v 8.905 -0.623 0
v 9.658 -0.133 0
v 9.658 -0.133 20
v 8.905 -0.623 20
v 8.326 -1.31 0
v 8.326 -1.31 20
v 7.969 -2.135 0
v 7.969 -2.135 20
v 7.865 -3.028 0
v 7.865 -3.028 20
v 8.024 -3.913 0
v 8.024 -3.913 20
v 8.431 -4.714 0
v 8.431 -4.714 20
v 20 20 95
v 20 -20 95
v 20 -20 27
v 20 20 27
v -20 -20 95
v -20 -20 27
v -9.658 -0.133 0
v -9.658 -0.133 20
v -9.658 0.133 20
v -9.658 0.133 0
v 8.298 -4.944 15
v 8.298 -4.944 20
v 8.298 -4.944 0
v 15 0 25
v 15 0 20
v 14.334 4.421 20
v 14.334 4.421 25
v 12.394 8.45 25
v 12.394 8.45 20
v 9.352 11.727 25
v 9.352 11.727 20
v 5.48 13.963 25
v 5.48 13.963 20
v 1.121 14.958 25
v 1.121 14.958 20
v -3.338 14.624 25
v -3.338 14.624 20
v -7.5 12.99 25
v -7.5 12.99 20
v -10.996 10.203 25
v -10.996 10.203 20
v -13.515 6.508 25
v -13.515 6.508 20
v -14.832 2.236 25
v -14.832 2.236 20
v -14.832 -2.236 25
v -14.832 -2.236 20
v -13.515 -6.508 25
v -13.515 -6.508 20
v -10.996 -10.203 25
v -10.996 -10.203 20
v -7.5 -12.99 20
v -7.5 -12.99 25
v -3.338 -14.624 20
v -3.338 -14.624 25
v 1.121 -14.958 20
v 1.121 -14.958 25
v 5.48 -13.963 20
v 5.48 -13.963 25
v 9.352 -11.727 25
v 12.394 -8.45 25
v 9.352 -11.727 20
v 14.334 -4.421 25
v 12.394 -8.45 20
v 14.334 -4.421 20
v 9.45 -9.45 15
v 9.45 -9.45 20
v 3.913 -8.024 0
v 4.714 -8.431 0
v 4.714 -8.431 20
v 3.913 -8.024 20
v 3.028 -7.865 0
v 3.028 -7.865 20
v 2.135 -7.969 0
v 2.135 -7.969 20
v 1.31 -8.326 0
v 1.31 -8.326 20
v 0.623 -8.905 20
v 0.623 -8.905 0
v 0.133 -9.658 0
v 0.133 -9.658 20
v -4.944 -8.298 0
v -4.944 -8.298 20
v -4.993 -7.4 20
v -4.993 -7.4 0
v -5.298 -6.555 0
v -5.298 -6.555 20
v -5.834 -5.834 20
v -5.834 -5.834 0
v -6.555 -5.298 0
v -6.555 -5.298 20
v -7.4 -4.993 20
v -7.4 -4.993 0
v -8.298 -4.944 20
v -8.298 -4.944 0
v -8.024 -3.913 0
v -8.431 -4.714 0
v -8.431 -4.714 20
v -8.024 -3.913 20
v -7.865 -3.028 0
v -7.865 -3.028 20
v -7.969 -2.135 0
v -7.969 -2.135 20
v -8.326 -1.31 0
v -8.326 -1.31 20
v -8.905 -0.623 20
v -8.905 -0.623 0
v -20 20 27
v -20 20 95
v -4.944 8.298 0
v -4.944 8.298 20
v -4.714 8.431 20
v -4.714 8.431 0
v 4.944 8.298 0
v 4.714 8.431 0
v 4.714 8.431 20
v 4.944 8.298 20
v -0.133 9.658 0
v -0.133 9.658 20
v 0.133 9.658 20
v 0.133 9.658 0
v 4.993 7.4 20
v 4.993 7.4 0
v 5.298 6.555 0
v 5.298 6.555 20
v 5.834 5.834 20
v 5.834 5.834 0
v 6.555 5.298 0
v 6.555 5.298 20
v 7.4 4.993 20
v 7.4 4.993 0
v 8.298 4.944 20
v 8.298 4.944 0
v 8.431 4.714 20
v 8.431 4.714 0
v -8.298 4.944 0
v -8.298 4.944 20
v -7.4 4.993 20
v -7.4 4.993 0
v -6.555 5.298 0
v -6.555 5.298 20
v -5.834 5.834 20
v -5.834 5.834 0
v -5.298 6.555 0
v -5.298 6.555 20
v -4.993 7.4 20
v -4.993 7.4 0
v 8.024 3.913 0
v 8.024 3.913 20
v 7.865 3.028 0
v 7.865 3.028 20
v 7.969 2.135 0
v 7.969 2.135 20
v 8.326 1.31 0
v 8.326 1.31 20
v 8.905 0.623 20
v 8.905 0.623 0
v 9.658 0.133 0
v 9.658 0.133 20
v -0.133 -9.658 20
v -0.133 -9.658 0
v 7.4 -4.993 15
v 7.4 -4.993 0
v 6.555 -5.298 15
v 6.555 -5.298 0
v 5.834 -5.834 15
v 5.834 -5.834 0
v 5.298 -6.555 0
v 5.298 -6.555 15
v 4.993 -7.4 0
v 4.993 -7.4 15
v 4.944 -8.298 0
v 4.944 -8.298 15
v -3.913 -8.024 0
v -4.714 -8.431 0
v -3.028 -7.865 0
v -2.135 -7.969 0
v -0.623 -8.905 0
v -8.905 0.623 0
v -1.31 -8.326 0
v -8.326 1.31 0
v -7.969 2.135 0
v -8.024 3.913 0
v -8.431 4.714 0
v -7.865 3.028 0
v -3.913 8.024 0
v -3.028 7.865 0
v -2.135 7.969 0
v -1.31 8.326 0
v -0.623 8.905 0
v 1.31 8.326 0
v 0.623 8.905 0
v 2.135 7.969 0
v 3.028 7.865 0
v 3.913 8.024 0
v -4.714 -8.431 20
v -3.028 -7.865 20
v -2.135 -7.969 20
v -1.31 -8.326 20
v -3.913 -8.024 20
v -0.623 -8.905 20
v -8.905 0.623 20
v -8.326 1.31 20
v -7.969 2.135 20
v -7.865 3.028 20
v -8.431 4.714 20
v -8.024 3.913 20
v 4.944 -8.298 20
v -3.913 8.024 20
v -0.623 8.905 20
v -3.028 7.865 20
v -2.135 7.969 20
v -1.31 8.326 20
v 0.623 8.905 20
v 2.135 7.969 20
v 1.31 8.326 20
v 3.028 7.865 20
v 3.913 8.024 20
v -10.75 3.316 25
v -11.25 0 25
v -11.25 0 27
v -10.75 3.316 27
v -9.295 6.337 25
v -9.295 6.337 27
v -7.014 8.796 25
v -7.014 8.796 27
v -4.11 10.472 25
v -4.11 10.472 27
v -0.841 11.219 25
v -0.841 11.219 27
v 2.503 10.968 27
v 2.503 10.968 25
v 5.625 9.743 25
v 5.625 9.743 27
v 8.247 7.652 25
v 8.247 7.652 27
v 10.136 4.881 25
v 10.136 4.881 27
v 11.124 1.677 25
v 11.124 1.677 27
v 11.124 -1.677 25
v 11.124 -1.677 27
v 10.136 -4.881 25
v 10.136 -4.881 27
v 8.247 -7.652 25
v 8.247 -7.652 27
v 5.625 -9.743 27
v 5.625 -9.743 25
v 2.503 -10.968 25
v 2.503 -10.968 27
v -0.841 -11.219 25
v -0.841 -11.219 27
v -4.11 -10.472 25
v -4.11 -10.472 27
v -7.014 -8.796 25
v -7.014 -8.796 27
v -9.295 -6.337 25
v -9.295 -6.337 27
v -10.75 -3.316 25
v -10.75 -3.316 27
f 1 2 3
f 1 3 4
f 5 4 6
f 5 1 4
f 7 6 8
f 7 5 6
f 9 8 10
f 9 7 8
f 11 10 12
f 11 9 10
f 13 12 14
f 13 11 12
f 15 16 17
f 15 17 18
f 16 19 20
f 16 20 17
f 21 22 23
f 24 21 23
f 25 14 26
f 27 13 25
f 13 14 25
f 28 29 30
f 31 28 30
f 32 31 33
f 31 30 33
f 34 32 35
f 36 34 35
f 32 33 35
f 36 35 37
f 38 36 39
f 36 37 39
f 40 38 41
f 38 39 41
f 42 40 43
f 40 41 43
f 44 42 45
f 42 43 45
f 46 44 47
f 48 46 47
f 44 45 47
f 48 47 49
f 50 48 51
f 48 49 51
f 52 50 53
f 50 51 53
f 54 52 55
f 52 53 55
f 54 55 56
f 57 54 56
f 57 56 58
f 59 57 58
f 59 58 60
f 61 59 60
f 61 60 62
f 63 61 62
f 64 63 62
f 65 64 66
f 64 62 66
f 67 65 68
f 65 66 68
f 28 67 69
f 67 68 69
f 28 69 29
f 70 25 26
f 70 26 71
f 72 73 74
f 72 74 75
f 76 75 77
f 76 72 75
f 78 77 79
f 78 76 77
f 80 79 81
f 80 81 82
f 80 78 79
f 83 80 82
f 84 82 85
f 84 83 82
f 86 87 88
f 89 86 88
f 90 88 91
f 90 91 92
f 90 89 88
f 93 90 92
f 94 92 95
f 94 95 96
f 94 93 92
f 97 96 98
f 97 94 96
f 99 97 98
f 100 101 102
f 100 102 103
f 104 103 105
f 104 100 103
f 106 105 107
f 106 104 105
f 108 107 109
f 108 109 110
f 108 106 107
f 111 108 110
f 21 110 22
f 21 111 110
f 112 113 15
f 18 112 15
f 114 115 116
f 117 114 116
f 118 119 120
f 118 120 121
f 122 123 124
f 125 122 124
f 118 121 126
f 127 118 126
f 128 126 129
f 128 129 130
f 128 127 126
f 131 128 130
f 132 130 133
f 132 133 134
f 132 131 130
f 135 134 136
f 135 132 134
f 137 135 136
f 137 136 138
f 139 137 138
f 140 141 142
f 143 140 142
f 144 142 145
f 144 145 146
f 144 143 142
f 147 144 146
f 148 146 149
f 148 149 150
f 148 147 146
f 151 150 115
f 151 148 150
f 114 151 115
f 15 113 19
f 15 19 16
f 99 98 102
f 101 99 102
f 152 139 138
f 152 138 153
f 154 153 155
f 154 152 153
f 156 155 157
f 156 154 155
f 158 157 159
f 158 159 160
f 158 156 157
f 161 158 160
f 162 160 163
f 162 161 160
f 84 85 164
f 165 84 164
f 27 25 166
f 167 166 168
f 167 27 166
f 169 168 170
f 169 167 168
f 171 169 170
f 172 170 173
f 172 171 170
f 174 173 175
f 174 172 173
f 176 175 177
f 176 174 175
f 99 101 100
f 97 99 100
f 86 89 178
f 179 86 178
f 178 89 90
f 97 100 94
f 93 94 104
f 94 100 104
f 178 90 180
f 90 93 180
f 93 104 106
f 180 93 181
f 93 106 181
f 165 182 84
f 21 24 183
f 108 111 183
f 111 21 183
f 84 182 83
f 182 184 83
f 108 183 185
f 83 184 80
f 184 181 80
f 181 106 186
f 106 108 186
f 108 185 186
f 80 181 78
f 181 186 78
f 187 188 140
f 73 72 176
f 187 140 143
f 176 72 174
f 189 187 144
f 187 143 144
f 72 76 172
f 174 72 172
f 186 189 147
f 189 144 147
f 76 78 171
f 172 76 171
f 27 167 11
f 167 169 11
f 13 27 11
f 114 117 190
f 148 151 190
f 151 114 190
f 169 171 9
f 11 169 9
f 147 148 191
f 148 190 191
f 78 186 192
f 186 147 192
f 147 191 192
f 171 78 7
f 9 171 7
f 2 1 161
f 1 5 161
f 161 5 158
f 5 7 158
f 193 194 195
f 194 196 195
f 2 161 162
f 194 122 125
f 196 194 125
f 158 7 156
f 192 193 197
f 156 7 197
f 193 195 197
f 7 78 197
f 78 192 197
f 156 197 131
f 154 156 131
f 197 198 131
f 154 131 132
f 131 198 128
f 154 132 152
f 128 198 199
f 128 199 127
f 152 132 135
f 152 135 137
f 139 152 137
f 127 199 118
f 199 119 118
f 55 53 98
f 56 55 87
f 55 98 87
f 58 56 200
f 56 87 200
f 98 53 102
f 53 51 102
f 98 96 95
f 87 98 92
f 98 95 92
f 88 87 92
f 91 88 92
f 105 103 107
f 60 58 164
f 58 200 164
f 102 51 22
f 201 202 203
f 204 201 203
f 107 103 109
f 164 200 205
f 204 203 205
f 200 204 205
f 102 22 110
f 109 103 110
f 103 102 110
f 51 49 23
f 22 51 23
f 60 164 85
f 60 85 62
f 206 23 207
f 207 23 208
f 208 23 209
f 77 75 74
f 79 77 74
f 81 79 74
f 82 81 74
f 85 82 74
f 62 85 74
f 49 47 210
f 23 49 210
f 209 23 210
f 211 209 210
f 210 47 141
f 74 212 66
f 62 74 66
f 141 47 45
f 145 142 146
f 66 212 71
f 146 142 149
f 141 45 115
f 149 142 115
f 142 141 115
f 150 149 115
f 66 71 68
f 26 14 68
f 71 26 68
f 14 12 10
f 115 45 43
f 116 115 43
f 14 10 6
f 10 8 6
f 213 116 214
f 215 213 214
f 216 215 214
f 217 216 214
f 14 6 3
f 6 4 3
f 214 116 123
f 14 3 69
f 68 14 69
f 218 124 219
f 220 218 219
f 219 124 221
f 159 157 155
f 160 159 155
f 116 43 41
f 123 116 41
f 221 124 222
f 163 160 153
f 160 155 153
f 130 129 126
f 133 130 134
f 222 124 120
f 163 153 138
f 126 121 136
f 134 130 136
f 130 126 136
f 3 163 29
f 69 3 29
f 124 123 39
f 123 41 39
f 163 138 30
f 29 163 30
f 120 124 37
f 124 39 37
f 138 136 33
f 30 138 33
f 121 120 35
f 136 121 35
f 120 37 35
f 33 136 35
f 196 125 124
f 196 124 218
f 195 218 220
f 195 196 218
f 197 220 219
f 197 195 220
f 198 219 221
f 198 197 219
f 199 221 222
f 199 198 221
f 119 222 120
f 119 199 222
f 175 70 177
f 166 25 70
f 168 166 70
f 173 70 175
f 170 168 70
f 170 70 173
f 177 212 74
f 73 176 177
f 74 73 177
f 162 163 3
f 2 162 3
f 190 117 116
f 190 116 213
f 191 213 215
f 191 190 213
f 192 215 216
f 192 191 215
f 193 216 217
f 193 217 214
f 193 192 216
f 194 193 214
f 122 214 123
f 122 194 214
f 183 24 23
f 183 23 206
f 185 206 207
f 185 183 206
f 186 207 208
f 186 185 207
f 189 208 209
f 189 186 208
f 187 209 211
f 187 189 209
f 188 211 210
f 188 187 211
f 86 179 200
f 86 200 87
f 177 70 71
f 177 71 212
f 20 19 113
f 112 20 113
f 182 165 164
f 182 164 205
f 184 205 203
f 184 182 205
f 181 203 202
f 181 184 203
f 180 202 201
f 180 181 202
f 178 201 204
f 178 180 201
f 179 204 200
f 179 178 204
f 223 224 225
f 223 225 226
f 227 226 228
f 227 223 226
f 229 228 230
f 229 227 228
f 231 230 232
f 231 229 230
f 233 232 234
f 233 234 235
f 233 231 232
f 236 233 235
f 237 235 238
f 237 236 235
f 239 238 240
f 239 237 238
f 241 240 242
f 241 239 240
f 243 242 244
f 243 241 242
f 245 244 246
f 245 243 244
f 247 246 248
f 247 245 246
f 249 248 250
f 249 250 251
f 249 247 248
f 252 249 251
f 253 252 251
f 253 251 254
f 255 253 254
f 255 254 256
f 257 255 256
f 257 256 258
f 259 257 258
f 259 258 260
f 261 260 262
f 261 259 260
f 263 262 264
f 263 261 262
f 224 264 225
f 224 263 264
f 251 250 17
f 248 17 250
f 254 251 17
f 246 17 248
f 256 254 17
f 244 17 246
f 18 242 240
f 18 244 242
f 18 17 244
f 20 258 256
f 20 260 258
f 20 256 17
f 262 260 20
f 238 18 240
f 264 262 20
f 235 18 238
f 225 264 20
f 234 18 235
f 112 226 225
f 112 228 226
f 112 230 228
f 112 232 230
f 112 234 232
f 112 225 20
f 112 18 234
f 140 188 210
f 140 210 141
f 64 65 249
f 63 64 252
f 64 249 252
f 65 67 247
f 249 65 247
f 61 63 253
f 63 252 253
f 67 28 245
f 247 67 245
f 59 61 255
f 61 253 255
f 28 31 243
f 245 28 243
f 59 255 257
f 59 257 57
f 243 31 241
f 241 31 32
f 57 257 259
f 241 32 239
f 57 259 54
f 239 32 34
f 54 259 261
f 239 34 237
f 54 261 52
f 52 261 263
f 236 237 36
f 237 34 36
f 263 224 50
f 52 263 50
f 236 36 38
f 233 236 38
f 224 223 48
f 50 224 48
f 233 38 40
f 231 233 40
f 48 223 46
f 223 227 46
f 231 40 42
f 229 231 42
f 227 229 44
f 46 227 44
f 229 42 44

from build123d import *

# Parameters (mm, degrees)
CROQUIS1_R              = 10
SALIENTE_EXTRUIR1_DEPTH = 20
CROQUIS2_R              = 10
CORTAR_EXTRUIR2_DEPTH   = 20
CROQUIS3_R              = 15
SALIENTE_EXTRUIR2_DEPTH = 5
SALIENTE_EXTRUIR3_START = 5
SALIENTE_EXTRUIR3_DEPTH = 5
CROQUIS6_W              = 40
CROQUIS6_H              = 40
SALIENTE_EXTRUIR4_DEPTH = 70
CROQUIS8_W              = 40
CROQUIS8_H              = 40
CROQUIS8_R              = 11.25
CORTAR_EXTRUIR3_DEPTH   = 2


with BuildPart() as part:
    # Croquis1 → Saliente-Extruir1 (new body)
    with BuildSketch(Plane.XY):
        Circle(CROQUIS1_R)
    extrude(amount=SALIENTE_EXTRUIR1_DEPTH)

    # Croquis2 → Cortar-Extruir2 (cut)
    with BuildSketch(Plane(origin=(0, 0, 0), x_dir=(-1, 0, 0), z_dir=(0, 0, -1))):
        Circle(CROQUIS2_R)
        with BuildLine():
            Line((0.133032496, 9.658342122), (-0.133032496, 9.658342122))
            ThreePointArc((-0.133032496, 9.658342122), (-2.135257122, 7.968888067), (-4.71396154, 8.430885884))
            Line((-4.71396154, 8.430885884), (-4.944380582, 8.297853388))
            ThreePointArc((-4.944380582, 8.297853388), (-5.833630945, 5.833630945), (-8.297853388, 4.944380582))
            Line((-8.297853388, 4.944380582), (-8.430885884, 4.71396154))
            ThreePointArc((-8.430885884, 4.71396154), (-7.968888067, 2.135257122), (-9.658342122, 0.133032496))
            Line((-9.658342122, 0.133032496), (-9.658342122, -0.133032496))
            ThreePointArc((-9.658342122, -0.133032496), (-7.968888067, -2.135257122), (-8.430885884, -4.71396154))
            Line((-8.430885884, -4.71396154), (-8.297853388, -4.944380582))
            ThreePointArc((-8.297853388, -4.944380582), (-5.833630945, -5.833630945), (-4.944380582, -8.297853388))
            Line((-4.944380582, -8.297853388), (-4.71396154, -8.430885884))
            ThreePointArc((-4.71396154, -8.430885884), (-2.135257122, -7.968888067), (-0.133032496, -9.658342122))
            Line((-0.133032496, -9.658342122), (0.133032496, -9.658342122))
            ThreePointArc((0.133032496, -9.658342122), (2.135257122, -7.968888067), (4.71396154, -8.430885884))
            Line((4.71396154, -8.430885884), (4.944380582, -8.297853388))
            ThreePointArc((4.944380582, -8.297853388), (5.833630945, -5.833630945), (8.297853388, -4.944380582))
            Line((8.297853388, -4.944380582), (8.430885884, -4.71396154))
            ThreePointArc((8.430885884, -4.71396154), (7.968888067, -2.135257122), (9.658342122, -0.133032496))
            Line((9.658342122, -0.133032496), (9.658342122, 0.133032496))
            ThreePointArc((9.658342122, 0.133032496), (7.968888067, 2.135257122), (8.430885884, 4.71396154))
            Line((8.430885884, 4.71396154), (8.297853388, 4.944380582))
            ThreePointArc((8.297853388, 4.944380582), (5.833630945, 5.833630945), (4.944380582, 8.297853388))
            Line((4.944380582, 8.297853388), (4.71396154, 8.430885884))
            ThreePointArc((4.71396154, 8.430885884), (2.135257122, 7.968888067), (0.133032496, 9.658342122))
        make_face(mode=Mode.SUBTRACT)
    extrude(amount=-CORTAR_EXTRUIR2_DEPTH, mode=Mode.SUBTRACT)

    # Croquis3 → Saliente-Extruir2 (add)
    with BuildSketch(Plane.XY.offset(20)):
        Circle(CROQUIS3_R)
    extrude(amount=SALIENTE_EXTRUIR2_DEPTH)

    # Croquis4 → Saliente-Extruir3 (add)
    with BuildSketch(Plane(origin=(0, 0, 20), x_dir=(-1, 0, 0), z_dir=(0, 0, -1)).offset(SALIENTE_EXTRUIR3_START)):
        Polygon((-9.44954411, -9.44954411), (-6.621116985, -6.621116985), (-8.297853388, -4.944380582), align=None)
        Polygon((-9.44954411, -9.44954411), (-4.944380582, -8.297853388), (-6.621116985, -6.621116985), align=None)
        with BuildLine():
            Line((-4.944380582, -8.297853388), (-8.297853388, -4.944380582))
            ThreePointArc((-8.297853388, -4.944380582), (-5.833630945, -5.833630945), (-4.944380582, -8.297853388))
        make_face()
    extrude(amount=-SALIENTE_EXTRUIR3_DEPTH)

    # Croquis6 → Saliente-Extruir4 (add)
    with BuildSketch(Plane.XY.offset(25)):
        Rectangle(CROQUIS6_W, CROQUIS6_H)
    extrude(amount=SALIENTE_EXTRUIR4_DEPTH)

    # Croquis8 → Cortar-Extruir3 (cut)
    with BuildSketch(Plane(origin=(0, 0, 25), x_dir=(-1, 0, 0), z_dir=(0, 0, -1))):
        Rectangle(CROQUIS8_W, CROQUIS8_H)
        Circle(CROQUIS8_R, mode=Mode.SUBTRACT)
    extrude(amount=-CORTAR_EXTRUIR3_DEPTH, mode=Mode.SUBTRACT)


solid = part.part
